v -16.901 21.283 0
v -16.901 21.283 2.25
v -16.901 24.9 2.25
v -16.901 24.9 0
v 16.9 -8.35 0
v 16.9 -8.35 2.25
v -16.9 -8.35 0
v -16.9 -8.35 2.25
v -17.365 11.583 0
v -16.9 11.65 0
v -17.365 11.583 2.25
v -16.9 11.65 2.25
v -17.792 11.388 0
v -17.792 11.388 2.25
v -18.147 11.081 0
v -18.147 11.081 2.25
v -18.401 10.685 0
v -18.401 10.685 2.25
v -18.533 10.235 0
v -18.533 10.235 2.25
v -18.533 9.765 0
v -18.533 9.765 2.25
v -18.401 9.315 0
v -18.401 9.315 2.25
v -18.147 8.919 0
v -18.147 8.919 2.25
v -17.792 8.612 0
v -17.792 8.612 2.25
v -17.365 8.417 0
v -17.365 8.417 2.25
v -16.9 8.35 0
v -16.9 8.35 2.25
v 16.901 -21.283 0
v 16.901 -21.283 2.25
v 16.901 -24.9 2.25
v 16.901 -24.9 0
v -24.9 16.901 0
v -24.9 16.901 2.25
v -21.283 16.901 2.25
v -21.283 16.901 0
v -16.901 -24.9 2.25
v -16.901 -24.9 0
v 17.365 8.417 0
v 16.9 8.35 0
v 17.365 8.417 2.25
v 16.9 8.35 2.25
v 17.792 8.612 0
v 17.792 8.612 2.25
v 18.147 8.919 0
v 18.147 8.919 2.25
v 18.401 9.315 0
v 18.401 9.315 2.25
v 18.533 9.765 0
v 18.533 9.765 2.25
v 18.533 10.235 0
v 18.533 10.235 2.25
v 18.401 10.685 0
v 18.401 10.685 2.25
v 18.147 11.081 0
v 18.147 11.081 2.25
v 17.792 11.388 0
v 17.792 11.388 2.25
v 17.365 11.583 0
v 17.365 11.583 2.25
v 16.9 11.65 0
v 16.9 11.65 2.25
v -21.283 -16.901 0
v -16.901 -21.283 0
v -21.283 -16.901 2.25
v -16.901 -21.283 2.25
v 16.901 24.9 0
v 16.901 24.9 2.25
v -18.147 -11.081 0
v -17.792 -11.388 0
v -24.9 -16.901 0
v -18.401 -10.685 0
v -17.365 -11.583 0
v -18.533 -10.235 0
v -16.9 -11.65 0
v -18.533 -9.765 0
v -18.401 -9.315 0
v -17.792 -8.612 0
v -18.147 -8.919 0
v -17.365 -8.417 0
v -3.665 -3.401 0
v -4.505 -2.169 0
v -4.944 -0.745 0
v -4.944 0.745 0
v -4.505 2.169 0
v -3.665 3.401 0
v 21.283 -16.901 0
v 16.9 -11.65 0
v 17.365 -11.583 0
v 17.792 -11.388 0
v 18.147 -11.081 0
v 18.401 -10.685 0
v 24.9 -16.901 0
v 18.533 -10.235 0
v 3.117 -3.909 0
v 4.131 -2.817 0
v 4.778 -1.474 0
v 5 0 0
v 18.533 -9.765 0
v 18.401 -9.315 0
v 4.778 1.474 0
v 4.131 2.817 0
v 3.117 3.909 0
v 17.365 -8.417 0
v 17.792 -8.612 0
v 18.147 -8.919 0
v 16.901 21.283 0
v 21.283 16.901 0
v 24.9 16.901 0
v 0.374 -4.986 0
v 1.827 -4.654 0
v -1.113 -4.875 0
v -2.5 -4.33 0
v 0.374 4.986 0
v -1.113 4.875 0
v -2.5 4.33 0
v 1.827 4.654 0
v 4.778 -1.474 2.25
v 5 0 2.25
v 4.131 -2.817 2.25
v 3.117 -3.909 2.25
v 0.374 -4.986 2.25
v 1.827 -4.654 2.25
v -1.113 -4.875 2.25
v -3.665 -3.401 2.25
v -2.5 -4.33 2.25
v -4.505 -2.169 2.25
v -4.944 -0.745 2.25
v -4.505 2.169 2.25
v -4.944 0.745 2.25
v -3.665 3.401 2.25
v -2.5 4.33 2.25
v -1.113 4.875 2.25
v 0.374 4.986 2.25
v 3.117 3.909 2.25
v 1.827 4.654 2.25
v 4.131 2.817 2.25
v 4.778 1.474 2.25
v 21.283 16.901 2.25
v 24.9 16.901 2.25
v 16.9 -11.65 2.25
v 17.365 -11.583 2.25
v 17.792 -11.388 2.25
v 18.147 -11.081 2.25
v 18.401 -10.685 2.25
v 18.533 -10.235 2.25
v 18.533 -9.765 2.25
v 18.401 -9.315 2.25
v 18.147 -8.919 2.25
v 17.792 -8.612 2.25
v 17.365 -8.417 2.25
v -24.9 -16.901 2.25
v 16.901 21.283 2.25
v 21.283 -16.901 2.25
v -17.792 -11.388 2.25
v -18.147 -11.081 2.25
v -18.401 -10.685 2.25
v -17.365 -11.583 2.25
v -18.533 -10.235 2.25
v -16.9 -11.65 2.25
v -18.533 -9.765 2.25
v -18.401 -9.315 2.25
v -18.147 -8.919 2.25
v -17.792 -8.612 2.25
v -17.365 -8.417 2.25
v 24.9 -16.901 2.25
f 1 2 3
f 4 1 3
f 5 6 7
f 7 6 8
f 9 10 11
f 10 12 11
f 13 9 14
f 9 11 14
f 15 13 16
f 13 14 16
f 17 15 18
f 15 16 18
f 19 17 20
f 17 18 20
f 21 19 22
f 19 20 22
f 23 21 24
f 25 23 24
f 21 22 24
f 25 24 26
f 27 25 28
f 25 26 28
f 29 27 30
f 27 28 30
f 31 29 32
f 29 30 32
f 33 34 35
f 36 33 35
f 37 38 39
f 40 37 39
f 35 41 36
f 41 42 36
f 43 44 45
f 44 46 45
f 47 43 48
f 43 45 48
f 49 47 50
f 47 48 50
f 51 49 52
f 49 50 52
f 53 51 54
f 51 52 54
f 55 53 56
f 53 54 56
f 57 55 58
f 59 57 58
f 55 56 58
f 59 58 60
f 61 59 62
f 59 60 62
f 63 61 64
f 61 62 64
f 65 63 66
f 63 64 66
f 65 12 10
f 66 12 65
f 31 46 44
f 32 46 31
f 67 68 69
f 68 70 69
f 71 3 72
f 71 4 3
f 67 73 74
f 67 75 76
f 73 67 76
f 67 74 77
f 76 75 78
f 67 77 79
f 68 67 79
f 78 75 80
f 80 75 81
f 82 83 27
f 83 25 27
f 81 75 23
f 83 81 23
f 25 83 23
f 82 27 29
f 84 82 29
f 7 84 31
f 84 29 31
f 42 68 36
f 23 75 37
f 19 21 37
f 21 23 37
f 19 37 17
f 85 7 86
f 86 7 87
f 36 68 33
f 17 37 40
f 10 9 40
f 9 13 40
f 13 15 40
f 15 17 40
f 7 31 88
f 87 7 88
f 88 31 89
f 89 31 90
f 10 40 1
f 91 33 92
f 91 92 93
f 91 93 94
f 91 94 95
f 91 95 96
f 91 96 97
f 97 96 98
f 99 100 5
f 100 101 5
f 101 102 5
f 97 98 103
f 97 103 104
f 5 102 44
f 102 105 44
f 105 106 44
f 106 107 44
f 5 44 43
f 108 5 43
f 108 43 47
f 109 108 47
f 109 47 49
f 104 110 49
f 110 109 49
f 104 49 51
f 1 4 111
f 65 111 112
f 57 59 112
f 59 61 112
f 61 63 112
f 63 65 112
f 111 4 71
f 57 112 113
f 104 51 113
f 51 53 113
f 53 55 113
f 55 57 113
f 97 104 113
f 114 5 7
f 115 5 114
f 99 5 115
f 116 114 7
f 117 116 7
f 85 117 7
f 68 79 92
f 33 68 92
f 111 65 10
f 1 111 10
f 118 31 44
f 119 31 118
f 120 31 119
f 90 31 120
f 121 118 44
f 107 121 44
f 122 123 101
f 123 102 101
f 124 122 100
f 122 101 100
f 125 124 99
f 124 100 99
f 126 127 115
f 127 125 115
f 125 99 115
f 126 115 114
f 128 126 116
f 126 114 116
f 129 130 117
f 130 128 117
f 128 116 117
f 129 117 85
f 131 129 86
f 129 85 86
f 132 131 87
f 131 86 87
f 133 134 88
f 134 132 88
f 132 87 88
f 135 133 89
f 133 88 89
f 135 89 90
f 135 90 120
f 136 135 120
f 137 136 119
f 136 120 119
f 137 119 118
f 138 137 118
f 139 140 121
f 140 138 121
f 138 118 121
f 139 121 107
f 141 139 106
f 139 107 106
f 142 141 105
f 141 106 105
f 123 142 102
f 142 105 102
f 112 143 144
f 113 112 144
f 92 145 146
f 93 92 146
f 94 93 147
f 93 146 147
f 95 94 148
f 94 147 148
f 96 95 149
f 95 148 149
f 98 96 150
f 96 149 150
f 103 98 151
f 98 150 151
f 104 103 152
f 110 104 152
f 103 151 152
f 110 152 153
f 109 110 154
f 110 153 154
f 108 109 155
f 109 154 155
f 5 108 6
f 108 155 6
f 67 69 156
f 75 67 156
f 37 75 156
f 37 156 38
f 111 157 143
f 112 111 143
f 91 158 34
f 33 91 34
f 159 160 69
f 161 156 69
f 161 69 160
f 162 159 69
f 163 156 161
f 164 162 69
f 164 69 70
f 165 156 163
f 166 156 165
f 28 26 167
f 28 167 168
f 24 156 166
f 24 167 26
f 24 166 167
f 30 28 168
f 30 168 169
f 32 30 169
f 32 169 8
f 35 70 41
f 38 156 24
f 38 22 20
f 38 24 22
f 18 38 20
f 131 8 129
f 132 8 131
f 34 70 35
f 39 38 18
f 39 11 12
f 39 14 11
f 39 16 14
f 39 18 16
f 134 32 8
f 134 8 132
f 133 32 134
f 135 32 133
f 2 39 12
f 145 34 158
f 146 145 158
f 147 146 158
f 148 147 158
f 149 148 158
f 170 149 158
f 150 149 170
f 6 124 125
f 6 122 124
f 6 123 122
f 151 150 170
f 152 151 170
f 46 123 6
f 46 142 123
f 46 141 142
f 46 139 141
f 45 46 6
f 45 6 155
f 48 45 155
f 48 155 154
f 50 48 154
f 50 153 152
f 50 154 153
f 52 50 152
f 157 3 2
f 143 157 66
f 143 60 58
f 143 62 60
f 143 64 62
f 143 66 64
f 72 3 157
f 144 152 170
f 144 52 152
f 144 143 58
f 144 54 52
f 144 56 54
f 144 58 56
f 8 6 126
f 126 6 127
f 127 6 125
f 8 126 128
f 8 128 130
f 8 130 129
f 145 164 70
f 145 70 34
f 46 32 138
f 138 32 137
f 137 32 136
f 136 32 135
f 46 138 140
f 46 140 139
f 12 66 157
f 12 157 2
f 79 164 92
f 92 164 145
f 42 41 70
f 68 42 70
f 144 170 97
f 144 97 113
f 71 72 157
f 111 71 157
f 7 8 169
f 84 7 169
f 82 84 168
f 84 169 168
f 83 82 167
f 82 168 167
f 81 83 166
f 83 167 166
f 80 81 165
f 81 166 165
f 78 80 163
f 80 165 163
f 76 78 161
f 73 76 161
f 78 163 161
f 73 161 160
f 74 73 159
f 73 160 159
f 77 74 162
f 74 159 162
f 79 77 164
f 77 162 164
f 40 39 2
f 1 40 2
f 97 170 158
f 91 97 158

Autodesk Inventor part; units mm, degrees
ref_plane "YZ Plane" through (0, 0, 0) normal (1, 0, 0) x (0, 1, 0)
ref_plane "Work Plane1" through (-29.1, -14.5, 2.4) normal (0, 0, -1) x (0, 1, 0)
ref_plane "Work Plane2" through (-13.8999, -10.5497, 2.25) normal (0, 0, -1) x (0, 1, 0)
sketch "Sketch1" plane through (0, 0, 0) normal (0, 0, 1) x (1, 0, 0)
  line L0 (-34.86, 0) -> (34.86, 0) construction
  line L1 (0, -34.86) -> (0, 34.86) construction
  line L2 (0, 0) -> (11.1575, 11.1575) construction
  line L3 (0, 0) -> (15.7791, 0) construction
  line L4 (0, 24.9) -> (16.8009, 24.9)
  line L5 (16.8009, 24.9) -> (16.8009, 21.2415)
  line L6 (16.8009, 21.2415) -> (19.0212, 19.0212)
  line L7 (24.9, 0) -> (24.9, 16.8009)
  line L8 (24.9, 16.8009) -> (21.2415, 16.8009)
  line L9 (21.2415, 16.8009) -> (19.0212, 19.0212)
  line L10 (0, -24.9) -> (16.8009, -24.9)
  line L11 (16.8009, -24.9) -> (16.8009, -21.2415)
  line L12 (16.8009, -21.2415) -> (19.0212, -19.0212)
  line L13 (24.9, 0) -> (24.9, -16.8009)
  line L14 (24.9, -16.8009) -> (21.2415, -16.8009)
  line L15 (21.2415, -16.8009) -> (19.0212, -19.0212)
  line L16 (0, 24.9) -> (-16.8009, 24.9)
  line L17 (-16.8009, 24.9) -> (-16.8009, 21.2415)
  line L18 (-16.8009, 21.2415) -> (-19.0212, 19.0212)
  line L19 (-24.9, 16.8009) -> (-21.2415, 16.8009)
  line L20 (-21.2415, 16.8009) -> (-19.0212, 19.0212)
  line L21 (0, -24.9) -> (-16.8009, -24.9)
  line L22 (-16.8009, -24.9) -> (-16.8009, -21.2415)
  line L23 (-16.8009, -21.2415) -> (-19.0212, -19.0212)
  line L24 (-21.2415, -16.8009) -> (-19.0212, -19.0212)
  line L25 (-24.9, -16.8009) -> (-21.2415, -16.8009)
  line L26 (-24.9, 0) -> (-24.9, -16.8009)
  line L27 (-24.9, 0) -> (-24.9, 16.8009)
  circle A0 centre (0, 0) radius 5
  dimension "d0" = 45
  dimension "d2" = 24.9
  dimension "d3" = 3.14
  dimension "d4" = 26.9
  dimension "d5" = 10
extrude "Extrusion1" add sketch "Sketch1" along normal up to surface (2.25 mm away)
sketch "Sketch5" plane through (0, 0, 0) normal (0, 0, -1) x (-1, 0, 0)
  circle A0 centre (-9.7, 10) radius 1.4
  circle A1 centre (-9.7, -10) radius 1.4
  circle A2 centre (13.8, 0) radius 1.4
  circle A3 centre (-10, 6.9) radius 0.75
  circle A4 centre (10, 6.9) radius 1.25
  point P0 (0, 0)
hole "Hole1" at (9.7, -10, 0) at (9.7, 10, 0) direction (0, 0, 1) diameter 3.3 depth 12 tip angle 118
sketch "Sketch6" plane through (-16.8009, 24.9, 2.25) normal (0, 0, 1) x (1, 0, 0)
  circle A0 centre (26.5009, -34.9) radius 1.65 construction
  circle A1 centre (26.5009, -14.9) radius 1.65 construction
  circle A2 centre (16.8009, -24.9) radius 5 construction
  line L0 (33.6017, -3.6585) -> (33.6017, 0) construction
  line L1 (33.6017, 0) -> (0, 0) construction
  line L2 (0, 0) -> (0, -3.6585) construction
  line L3 (0, -3.6585) -> (-4.4406, -8.0991) construction
  line L4 (-4.4406, -8.0991) -> (-8.0991, -8.0991) construction
  line L5 (-8.0991, -8.0991) -> (-8.0991, -41.7009) construction
  line L6 (-8.0991, -41.7009) -> (-4.4406, -41.7009) construction
  line L7 (-4.4406, -41.7009) -> (0, -46.1415) construction
  line L8 (0, -46.1415) -> (0, -49.8) construction
  line L9 (0, -49.8) -> (33.6017, -49.8) construction
  line L10 (33.6017, -49.8) -> (33.6017, -46.1415) construction
  line L11 (33.6017, -46.1415) -> (38.0423, -41.7009) construction
  line L12 (38.0423, -41.7009) -> (41.7009, -41.7009) construction
  line L13 (41.7009, -41.7009) -> (41.7009, -8.0991) construction
  line L14 (41.7009, -8.0991) -> (38.0423, -8.0991) construction
  line L15 (38.0423, -8.0991) -> (33.6017, -3.6585) construction
  line L16 (33.7009, -14.9) -> (-0.0991, -14.9)
  line L17 (33.7009, -16.55) -> (-0.0991, -16.55)
  line L18 (-0.0991, -13.25) -> (33.7009, -13.25)
  arc A3 (33.7009, -16.55) -> (33.7009, -13.25) centre (33.7009, -14.9) ccw
  arc A4 (-0.0991, -13.25) -> (-0.0991, -16.55) centre (-0.0991, -14.9) ccw
  line L19 (-8.0991, -41.7009) -> (-8.0991, -8.0991) construction
  line L20 (-8.0991, -24.9) -> (41.7009, -24.9) construction
  line L21 (41.7009, -8.0991) -> (41.7009, -41.7009) construction
  circle A5 centre (26.5009, -34.9) radius 1.65 construction
  line L22 (33.7009, -34.9) -> (-0.0991, -34.9)
  line L23 (33.7009, -33.25) -> (-0.0991, -33.25)
  line L24 (-0.0991, -36.55) -> (33.7009, -36.55)
  arc A6 (33.7009, -36.55) -> (33.7009, -33.25) centre (33.7009, -34.9) ccw
  arc A7 (-0.0991, -33.25) -> (-0.0991, -36.55) centre (-0.0991, -34.9) ccw
  point P0 (16.8009, -24.9)
  point P1 (16.8009, -14.9)
  point P2 (16.8009, -34.9)
  dimension "d25" = 8
  dimension "d26" = 8
extrude "Extrusion5" cut sketch "Sketch6" against normal through all
sketch "Skizze7" plane through (-16.8009, 24.9, 2.25) normal (0, 0, 1) x (1, 0, 0)
  line L0 (33.7009, -16.55) -> (-0.0991, -16.55) construction
  arc A0 (-0.0991, -13.25) -> (-0.0991, -16.55) centre (-0.0991, -14.9) ccw construction
  line L1 (-0.0991, -13.25) -> (33.7009, -13.25) construction
  arc A1 (33.7009, -16.55) -> (33.7009, -13.25) centre (33.7009, -14.9) ccw construction
  line L2 (-0.0991, -33.25) -> (33.7009, -33.25) construction
  arc A2 (33.7009, -36.55) -> (33.7009, -33.25) centre (33.7009, -34.9) ccw construction
  line L3 (33.7009, -36.55) -> (-0.0991, -36.55) construction
  arc A3 (-0.0991, -33.25) -> (-0.0991, -36.55) centre (-0.0991, -34.9) ccw construction
  circle A4 centre (16.8009, -24.9) radius 5 construction
  line L4 (33.6017, -3.6585) -> (33.6017, 0) projected
  line L5 (33.6017, 0) -> (0, 0) construction
  line L6 (0, 0) -> (0, -3.6585) projected
  line L7 (0, -3.6585) -> (-4.4406, -8.0991) projected
  line L8 (-4.4406, -8.0991) -> (-8.0991, -8.0991) projected
  line L9 (-8.0991, -8.0991) -> (-8.0991, -41.7009) construction
  line L10 (-8.0991, -41.7009) -> (-4.4406, -41.7009) projected
  line L11 (-4.4406, -41.7009) -> (0, -46.1415) projected
  line L12 (0, -46.1415) -> (0, -49.8) projected
  line L13 (0, -49.8) -> (33.6017, -49.8) construction
  line L14 (33.6017, -49.8) -> (33.6017, -46.1415) projected
  line L15 (33.6017, -46.1415) -> (38.0423, -41.7009) projected
  line L16 (38.0423, -41.7009) -> (41.7009, -41.7009) projected
  line L17 (41.7009, -41.7009) -> (41.7009, -8.0991) construction
  line L18 (41.7009, -8.0991) -> (38.0423, -8.0991) projected
  line L19 (38.0423, -8.0991) -> (33.6017, -3.6585) projected
  line L20 (-0.1, 0.1) -> (33.7017, 0.1) construction
  line L21 (33.7017, 0.1) -> (33.7017, -3.6171)
  line L22 (33.7017, -3.6171) -> (38.0838, -7.9991)
  line L23 (38.0838, -7.9991) -> (41.8009, -7.9991)
  line L24 (41.8009, -7.9991) -> (41.8009, -41.8009) construction
  line L25 (41.8009, -41.8009) -> (38.0838, -41.8009)
  line L26 (38.0838, -41.8009) -> (33.7017, -46.1829)
  line L27 (33.7017, -46.1829) -> (33.7017, -49.9)
  line L28 (33.7017, -49.9) -> (-0.1, -49.9) construction
  line L29 (-0.1, -49.9) -> (-0.1, -46.1829)
  line L30 (-0.1, -46.1829) -> (-4.4821, -41.8009)
  line L31 (-4.4821, -41.8009) -> (-8.1991, -41.8009)
  line L32 (-8.1991, -41.8009) -> (-8.1991, -7.9991) construction
  line L33 (-8.1991, -7.9991) -> (-4.4821, -7.9991)
  line L34 (-4.4821, -7.9991) -> (-0.1, -3.6171)
  line L35 (-0.1, -3.6171) -> (-0.1, 0.1)
  line L36 (33.6017, 0) -> (0, 0) projected
  line L37 (0, 0) -> (-0.1, 0)
  line L38 (-8.0991, -41.7009) -> (-8.0991, -8.0991) projected
  line L39 (-8.0991, -8.0991) -> (-8.0991, -7.9991)
  line L40 (33.6017, 0) -> (33.6017, -3.6585) projected
  line L41 (33.6017, 0) -> (33.7017, 0)
  line L42 (41.7009, -8.0991) -> (41.7009, -7.9991)
  line L43 (41.7009, -41.7009) -> (38.0423, -41.7009) projected
  line L44 (41.7009, -41.7009) -> (41.7009, -41.8009)
  line L45 (33.6017, -49.8) -> (33.7017, -49.8)
  line L46 (0, -49.8) -> (0, -46.1415) projected
  line L47 (0, -49.8) -> (-0.1, -49.8)
  line L48 (-8.0991, -41.7009) -> (-8.0991, -41.8009)
  point P0 (16.8009, -24.9)
  dimension "d29" = 0.1
extrude "IM_offset" add sketch "Skizze7" against normal up to surface (2.25 mm away)
properties part number "20_Cube_insert_Sample_holder"
